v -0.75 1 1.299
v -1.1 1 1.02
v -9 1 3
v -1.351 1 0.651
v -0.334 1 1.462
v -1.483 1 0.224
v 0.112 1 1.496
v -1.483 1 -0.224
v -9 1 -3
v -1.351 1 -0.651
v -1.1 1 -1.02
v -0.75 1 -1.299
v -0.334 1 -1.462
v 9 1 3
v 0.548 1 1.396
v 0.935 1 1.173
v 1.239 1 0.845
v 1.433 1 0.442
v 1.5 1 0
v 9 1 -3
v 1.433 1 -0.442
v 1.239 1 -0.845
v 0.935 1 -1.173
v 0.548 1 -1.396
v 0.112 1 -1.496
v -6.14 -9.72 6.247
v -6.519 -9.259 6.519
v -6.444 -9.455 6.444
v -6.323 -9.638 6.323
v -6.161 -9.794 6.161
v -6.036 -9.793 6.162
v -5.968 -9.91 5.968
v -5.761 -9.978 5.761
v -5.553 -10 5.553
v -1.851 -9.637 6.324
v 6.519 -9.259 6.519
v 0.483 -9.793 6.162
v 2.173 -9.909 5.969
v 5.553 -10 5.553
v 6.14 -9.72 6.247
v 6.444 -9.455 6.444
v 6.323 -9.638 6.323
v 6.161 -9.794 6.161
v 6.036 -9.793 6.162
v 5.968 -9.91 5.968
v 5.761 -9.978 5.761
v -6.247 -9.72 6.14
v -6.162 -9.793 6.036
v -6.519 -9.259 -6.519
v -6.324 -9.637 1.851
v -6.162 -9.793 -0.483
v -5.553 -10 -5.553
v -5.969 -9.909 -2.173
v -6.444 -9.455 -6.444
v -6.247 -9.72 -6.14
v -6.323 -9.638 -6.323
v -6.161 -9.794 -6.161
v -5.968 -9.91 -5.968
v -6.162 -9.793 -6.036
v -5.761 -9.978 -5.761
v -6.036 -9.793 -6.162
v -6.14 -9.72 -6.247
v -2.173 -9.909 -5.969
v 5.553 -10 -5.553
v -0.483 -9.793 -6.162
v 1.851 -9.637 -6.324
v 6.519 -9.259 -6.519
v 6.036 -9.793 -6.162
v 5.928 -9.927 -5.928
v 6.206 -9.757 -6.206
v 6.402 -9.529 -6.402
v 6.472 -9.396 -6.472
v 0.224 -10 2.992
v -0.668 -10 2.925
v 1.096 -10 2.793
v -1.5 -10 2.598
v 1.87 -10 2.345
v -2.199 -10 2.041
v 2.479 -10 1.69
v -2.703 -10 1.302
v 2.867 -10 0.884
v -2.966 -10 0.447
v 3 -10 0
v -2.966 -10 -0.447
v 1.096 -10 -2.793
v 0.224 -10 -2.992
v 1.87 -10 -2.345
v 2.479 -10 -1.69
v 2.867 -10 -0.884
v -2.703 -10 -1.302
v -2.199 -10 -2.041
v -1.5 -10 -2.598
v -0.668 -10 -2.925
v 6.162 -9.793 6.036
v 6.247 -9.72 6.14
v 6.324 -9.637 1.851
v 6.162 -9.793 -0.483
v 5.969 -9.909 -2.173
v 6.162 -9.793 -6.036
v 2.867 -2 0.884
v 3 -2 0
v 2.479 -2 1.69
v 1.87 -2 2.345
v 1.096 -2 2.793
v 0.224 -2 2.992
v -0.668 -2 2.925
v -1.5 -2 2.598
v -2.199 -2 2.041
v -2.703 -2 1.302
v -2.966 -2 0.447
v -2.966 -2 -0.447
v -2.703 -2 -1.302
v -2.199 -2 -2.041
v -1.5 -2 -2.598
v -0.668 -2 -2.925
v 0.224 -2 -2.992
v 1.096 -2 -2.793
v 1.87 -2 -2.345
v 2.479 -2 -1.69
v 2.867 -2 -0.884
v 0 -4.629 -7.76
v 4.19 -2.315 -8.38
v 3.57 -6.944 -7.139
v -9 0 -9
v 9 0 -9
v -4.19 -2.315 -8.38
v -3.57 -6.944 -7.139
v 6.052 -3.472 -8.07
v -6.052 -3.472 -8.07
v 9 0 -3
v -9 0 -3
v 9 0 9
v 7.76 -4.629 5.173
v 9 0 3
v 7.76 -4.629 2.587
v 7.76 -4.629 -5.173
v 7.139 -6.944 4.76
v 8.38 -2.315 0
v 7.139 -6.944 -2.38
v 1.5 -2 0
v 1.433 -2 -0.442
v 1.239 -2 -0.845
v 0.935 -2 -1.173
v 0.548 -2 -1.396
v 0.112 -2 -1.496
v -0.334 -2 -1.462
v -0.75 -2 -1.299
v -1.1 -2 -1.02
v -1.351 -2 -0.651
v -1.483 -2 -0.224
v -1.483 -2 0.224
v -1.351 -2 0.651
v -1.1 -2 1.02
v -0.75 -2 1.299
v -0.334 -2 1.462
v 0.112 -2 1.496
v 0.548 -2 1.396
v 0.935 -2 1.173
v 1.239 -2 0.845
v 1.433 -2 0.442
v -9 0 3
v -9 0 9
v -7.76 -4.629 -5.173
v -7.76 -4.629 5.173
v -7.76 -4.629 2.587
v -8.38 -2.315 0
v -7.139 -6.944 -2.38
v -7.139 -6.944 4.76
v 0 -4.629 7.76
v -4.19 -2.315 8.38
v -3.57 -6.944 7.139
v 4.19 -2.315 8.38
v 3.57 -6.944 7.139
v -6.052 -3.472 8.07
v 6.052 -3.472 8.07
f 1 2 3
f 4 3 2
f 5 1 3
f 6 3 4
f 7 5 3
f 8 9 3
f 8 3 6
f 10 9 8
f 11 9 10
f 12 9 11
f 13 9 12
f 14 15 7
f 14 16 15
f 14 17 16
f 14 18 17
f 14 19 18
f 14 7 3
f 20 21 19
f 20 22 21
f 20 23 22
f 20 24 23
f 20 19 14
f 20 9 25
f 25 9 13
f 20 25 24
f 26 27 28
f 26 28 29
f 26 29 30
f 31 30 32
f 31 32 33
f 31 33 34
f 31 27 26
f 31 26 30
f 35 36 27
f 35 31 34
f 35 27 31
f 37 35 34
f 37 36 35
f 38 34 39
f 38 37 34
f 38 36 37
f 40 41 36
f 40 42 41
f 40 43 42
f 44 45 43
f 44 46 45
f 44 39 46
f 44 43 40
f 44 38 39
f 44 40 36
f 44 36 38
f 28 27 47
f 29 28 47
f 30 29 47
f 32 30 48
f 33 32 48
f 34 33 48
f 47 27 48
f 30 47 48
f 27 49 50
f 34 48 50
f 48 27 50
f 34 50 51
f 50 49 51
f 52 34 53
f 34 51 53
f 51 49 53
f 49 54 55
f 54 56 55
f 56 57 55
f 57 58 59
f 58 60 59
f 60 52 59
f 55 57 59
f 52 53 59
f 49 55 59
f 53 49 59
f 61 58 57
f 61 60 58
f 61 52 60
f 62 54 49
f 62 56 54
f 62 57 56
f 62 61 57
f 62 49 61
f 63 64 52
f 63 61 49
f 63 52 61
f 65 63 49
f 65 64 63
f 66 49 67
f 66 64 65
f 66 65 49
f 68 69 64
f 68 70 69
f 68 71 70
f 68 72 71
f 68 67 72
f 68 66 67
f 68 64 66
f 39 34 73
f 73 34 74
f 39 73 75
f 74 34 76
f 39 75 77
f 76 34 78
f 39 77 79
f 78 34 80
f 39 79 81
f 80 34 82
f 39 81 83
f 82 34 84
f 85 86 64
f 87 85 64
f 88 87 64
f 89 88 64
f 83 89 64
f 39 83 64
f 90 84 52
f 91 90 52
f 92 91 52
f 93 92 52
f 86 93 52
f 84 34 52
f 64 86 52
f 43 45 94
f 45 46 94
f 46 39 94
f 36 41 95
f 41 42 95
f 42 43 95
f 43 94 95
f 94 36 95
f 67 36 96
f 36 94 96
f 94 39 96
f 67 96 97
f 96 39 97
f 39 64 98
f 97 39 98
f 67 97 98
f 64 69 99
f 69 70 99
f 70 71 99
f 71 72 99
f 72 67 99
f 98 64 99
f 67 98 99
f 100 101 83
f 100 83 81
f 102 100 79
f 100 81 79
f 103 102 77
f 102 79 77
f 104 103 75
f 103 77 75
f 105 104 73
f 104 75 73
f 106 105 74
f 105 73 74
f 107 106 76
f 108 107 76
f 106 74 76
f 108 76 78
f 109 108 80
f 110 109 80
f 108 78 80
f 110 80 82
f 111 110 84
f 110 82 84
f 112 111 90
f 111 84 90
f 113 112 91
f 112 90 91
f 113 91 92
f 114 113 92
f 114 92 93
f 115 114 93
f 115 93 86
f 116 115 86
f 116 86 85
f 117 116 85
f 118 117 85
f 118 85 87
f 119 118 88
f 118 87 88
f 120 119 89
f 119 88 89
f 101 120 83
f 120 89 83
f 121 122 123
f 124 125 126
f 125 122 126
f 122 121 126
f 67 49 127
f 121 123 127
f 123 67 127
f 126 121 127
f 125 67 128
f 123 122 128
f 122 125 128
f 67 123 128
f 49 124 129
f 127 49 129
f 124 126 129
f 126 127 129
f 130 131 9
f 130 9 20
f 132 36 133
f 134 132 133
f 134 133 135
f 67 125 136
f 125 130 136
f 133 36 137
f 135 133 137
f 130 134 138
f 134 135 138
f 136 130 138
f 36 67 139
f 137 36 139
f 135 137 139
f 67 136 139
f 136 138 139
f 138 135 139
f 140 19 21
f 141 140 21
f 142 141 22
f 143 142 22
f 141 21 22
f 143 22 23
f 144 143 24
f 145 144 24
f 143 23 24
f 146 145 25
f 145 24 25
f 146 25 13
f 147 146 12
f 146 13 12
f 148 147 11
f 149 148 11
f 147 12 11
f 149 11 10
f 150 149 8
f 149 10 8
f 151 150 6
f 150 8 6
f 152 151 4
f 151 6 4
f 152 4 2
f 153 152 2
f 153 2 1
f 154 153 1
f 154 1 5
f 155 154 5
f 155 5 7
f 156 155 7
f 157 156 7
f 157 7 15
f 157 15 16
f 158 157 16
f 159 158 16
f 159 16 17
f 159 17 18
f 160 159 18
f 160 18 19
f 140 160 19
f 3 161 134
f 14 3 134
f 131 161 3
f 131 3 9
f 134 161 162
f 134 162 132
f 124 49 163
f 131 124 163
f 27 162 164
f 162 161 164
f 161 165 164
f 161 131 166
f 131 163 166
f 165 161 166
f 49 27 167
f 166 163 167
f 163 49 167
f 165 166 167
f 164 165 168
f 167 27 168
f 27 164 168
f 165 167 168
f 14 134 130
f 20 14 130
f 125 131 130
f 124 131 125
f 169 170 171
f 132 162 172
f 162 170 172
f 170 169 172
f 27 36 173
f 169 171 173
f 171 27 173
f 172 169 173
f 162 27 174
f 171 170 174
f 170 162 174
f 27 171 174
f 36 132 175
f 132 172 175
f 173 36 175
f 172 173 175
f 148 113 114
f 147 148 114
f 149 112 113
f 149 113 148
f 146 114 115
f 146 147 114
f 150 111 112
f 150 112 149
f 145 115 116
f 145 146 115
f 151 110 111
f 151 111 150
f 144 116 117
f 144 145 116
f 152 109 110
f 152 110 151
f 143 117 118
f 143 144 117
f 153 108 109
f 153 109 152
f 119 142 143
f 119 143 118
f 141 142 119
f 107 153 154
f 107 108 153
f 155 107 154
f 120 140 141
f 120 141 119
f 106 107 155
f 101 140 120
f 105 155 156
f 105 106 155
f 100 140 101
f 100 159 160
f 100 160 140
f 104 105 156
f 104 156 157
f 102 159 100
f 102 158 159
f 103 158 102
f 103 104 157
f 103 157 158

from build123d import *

# Parameters (mm, degrees)
SKETCH1_W           = 18
SKETCH1_H           = 18
BOSS_EXTRUDE1_DEPTH = 10
BOSS_EXTRUDE1_TAPER = 15
SKETCH5_W           = 18
SKETCH5_H           = 6
BOSS_EXTRUDE3_DEPTH = 3
FILLET2_R           = 1
CUT_EXTRUDE3_REACH  = 15
SKETCH6_R           = 1.5
SKETCH7_R           = 3
CUT_EXTRUDE4_DEPTH  = 8
SKETCH9_W           = 20
SKETCH9_H           = 6
CUT_EXTRUDE5_DEPTH  = 2
FILLET4_R           = 1


with BuildPart() as part:
    # Sketch1 → Boss-Extrude1 (new body)
    with BuildSketch(Plane(origin=(0, 0, 0), x_dir=(1, 0, 0), z_dir=(0, 1, 0))):
        Rectangle(SKETCH1_W, SKETCH1_H)
    extrude(amount=-BOSS_EXTRUDE1_DEPTH, taper=BOSS_EXTRUDE1_TAPER)

    # Sketch5 → Boss-Extrude3 (add)
    with BuildSketch(Plane(origin=(0, 0, 0), x_dir=(1, 0, 0), z_dir=(0, 1, 0))):
        Rectangle(SKETCH5_W, SKETCH5_H)
    extrude(amount=BOSS_EXTRUDE3_DEPTH)

    # Fillet2
    fillet2_edges = [part.edges().sort_by_distance(p)[0] for p in [
        (0, 3, 3),
        (0, 3, -3),
    ]]
    fillet(fillet2_edges, radius=FILLET2_R)

    # Sketch6 → Cut-Extrude3 (cut, up to next)
    with BuildSketch(Plane(origin=(0, 3, 0), x_dir=(1, 0, 0), z_dir=(0, 1, 0)), mode=Mode.PRIVATE) as cut_extrude3_sk1:
        Circle(SKETCH6_R)
    cut_extrude3_tool1 = extrude(cut_extrude3_sk1.sketch, amount=-CUT_EXTRUDE3_REACH, mode=Mode.PRIVATE) & part.part
    add(cut_extrude3_tool1.solids().sort_by_distance((0, 3, 0))[0], mode=Mode.SUBTRACT)

    # Sketch7 → Cut-Extrude4 (cut)
    with BuildSketch(Plane.XZ.offset(10)):
        Circle(SKETCH7_R)
    extrude(amount=-CUT_EXTRUDE4_DEPTH, mode=Mode.SUBTRACT)

    # Sketch9 → Cut-Extrude5 (cut)
    with BuildSketch(Plane(origin=(0, 3, 0), x_dir=(1, 0, 0), z_dir=(0, 1, 0))):
        Rectangle(SKETCH9_W, SKETCH9_H)
    extrude(amount=-CUT_EXTRUDE5_DEPTH, mode=Mode.SUBTRACT)

    # Fillet4
    fillet4_edges = [part.edges().sort_by_distance(p)[0] for p in [
        (-6.320508076, -10, 0),
        (0, -10, 6.320508076),
        (6.320508076, -10, 0),
        (0, -10, -6.320508076),
    ]]
    fillet(fillet4_edges, radius=FILLET4_R)


solid = part.part
